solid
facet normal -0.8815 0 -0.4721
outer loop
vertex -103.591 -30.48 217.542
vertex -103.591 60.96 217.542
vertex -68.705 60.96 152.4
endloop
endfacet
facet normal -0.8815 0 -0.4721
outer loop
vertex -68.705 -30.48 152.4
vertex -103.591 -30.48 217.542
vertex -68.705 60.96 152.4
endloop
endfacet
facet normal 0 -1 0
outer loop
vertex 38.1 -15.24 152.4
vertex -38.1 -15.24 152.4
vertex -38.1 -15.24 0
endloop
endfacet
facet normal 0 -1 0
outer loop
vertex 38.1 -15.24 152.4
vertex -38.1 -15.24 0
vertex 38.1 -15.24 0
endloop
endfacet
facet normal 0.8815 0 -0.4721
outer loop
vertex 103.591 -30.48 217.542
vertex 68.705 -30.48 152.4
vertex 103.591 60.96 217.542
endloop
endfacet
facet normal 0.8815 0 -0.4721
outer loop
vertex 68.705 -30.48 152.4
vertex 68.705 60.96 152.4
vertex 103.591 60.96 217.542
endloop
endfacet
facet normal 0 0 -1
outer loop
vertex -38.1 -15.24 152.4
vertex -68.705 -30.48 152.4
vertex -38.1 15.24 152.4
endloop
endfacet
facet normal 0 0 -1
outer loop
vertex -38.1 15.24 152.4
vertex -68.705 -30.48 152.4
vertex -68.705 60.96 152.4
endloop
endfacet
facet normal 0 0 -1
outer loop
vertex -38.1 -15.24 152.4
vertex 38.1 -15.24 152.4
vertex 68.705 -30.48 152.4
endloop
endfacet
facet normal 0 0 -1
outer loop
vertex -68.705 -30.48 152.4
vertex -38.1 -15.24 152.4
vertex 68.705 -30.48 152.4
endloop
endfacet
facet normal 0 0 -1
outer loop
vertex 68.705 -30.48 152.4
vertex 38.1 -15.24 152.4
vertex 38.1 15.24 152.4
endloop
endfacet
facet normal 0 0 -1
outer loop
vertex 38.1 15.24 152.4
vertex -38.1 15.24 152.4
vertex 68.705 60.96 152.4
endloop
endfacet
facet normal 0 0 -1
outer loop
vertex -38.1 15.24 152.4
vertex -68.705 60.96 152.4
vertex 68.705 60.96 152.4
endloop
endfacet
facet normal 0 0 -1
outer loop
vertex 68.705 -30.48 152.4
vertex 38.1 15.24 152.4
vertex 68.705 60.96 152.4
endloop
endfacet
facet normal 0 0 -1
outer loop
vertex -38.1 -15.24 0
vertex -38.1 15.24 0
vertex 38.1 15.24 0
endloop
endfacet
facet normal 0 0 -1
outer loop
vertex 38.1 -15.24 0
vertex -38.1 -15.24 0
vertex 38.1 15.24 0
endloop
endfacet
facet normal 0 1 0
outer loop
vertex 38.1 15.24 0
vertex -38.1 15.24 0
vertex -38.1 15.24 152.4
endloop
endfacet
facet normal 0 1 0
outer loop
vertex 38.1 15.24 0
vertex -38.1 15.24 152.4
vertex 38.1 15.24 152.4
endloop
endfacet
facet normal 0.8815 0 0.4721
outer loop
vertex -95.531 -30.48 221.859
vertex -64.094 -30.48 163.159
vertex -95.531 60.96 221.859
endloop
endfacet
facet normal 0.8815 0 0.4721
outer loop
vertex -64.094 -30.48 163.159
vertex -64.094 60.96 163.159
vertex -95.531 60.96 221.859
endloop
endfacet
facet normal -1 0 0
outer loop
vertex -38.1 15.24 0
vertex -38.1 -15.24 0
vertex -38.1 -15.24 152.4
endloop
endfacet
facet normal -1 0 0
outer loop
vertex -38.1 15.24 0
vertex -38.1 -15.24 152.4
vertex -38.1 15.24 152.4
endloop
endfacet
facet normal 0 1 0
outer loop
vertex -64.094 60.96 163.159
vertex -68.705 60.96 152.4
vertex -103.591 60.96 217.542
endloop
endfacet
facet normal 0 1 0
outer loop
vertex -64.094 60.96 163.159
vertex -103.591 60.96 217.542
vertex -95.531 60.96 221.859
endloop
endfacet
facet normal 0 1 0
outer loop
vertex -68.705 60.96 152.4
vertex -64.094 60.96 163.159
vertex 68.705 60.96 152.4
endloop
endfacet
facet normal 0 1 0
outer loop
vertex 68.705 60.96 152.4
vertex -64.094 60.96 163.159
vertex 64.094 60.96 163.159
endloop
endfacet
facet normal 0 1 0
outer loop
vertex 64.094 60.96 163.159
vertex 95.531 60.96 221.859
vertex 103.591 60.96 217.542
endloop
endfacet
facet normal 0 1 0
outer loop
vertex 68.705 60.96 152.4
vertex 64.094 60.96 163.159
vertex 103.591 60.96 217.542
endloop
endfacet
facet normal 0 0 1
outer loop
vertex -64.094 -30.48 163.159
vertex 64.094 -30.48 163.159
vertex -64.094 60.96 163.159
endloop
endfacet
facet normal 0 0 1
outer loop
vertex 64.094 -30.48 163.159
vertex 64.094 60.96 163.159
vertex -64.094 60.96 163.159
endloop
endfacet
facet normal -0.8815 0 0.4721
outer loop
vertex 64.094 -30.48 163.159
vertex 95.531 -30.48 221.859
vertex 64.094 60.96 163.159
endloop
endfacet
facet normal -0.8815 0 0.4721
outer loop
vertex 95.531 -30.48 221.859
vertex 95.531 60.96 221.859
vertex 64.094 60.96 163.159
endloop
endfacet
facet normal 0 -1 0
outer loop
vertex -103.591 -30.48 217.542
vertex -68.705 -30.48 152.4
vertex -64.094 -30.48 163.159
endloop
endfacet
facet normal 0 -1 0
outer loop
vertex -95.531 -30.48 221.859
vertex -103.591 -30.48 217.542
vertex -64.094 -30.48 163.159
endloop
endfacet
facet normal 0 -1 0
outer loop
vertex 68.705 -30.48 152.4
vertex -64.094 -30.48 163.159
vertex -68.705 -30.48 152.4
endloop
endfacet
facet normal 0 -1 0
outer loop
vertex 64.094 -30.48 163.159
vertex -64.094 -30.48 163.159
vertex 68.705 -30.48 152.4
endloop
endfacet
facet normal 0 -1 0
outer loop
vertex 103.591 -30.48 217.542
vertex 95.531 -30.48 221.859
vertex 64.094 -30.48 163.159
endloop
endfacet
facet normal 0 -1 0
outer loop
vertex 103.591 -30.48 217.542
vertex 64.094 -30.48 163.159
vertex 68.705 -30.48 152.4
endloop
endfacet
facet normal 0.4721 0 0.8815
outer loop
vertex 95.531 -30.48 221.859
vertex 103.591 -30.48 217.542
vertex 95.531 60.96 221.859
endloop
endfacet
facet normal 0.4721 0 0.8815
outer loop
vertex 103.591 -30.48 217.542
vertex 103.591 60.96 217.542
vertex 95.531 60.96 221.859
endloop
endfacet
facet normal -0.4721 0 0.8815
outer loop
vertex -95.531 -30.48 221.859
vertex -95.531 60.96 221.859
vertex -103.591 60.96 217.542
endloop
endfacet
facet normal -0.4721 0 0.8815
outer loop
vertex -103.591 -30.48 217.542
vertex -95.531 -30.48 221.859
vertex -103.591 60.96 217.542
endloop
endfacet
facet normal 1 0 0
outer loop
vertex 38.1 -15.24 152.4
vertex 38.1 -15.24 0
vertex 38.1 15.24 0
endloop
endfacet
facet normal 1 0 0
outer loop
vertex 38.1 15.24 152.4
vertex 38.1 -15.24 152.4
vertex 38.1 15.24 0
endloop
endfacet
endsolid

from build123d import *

# Parameters (mm, degrees)
F0_W     = 76.2
F0_H     = 30.48
F1_DEPTH = 152.4
F3_DEPTH = 76.2
F4_DEPTH = 15.24


with BuildPart() as f1:
    # F0 (on Top) → F1 (new body)
    with BuildSketch(Plane.XY):
        Rectangle(F0_W, F0_H)
    extrude(amount=F1_DEPTH)

    # F2 (on face) → F3 (join)
    with BuildSketch(Plane.XZ.offset(15.24)):
        Polygon((-68.705104, 152.4), (-38.1, 152.4), (38.1, 152.4), (68.705104, 152.4), (103.591479, 217.541933), (95.530655, 221.858859), (64.094205, 163.158833), (0, 163.158833), (-64.094205, 163.158833), (-95.530655, 221.858859), (-103.591479, 217.541933), align=None)
    extrude(amount=-F3_DEPTH)

    # F2 (on face) → F4 (join)
    with BuildSketch(Plane.XZ.offset(15.24)):
        Polygon((-68.705104, 152.4), (-38.1, 152.4), (38.1, 152.4), (68.705104, 152.4), (103.591479, 217.541933), (95.530655, 221.858859), (64.094205, 163.158833), (0, 163.158833), (-64.094205, 163.158833), (-95.530655, 221.858859), (-103.591479, 217.541933), align=None)
    extrude(amount=F4_DEPTH)


solid = f1.part
